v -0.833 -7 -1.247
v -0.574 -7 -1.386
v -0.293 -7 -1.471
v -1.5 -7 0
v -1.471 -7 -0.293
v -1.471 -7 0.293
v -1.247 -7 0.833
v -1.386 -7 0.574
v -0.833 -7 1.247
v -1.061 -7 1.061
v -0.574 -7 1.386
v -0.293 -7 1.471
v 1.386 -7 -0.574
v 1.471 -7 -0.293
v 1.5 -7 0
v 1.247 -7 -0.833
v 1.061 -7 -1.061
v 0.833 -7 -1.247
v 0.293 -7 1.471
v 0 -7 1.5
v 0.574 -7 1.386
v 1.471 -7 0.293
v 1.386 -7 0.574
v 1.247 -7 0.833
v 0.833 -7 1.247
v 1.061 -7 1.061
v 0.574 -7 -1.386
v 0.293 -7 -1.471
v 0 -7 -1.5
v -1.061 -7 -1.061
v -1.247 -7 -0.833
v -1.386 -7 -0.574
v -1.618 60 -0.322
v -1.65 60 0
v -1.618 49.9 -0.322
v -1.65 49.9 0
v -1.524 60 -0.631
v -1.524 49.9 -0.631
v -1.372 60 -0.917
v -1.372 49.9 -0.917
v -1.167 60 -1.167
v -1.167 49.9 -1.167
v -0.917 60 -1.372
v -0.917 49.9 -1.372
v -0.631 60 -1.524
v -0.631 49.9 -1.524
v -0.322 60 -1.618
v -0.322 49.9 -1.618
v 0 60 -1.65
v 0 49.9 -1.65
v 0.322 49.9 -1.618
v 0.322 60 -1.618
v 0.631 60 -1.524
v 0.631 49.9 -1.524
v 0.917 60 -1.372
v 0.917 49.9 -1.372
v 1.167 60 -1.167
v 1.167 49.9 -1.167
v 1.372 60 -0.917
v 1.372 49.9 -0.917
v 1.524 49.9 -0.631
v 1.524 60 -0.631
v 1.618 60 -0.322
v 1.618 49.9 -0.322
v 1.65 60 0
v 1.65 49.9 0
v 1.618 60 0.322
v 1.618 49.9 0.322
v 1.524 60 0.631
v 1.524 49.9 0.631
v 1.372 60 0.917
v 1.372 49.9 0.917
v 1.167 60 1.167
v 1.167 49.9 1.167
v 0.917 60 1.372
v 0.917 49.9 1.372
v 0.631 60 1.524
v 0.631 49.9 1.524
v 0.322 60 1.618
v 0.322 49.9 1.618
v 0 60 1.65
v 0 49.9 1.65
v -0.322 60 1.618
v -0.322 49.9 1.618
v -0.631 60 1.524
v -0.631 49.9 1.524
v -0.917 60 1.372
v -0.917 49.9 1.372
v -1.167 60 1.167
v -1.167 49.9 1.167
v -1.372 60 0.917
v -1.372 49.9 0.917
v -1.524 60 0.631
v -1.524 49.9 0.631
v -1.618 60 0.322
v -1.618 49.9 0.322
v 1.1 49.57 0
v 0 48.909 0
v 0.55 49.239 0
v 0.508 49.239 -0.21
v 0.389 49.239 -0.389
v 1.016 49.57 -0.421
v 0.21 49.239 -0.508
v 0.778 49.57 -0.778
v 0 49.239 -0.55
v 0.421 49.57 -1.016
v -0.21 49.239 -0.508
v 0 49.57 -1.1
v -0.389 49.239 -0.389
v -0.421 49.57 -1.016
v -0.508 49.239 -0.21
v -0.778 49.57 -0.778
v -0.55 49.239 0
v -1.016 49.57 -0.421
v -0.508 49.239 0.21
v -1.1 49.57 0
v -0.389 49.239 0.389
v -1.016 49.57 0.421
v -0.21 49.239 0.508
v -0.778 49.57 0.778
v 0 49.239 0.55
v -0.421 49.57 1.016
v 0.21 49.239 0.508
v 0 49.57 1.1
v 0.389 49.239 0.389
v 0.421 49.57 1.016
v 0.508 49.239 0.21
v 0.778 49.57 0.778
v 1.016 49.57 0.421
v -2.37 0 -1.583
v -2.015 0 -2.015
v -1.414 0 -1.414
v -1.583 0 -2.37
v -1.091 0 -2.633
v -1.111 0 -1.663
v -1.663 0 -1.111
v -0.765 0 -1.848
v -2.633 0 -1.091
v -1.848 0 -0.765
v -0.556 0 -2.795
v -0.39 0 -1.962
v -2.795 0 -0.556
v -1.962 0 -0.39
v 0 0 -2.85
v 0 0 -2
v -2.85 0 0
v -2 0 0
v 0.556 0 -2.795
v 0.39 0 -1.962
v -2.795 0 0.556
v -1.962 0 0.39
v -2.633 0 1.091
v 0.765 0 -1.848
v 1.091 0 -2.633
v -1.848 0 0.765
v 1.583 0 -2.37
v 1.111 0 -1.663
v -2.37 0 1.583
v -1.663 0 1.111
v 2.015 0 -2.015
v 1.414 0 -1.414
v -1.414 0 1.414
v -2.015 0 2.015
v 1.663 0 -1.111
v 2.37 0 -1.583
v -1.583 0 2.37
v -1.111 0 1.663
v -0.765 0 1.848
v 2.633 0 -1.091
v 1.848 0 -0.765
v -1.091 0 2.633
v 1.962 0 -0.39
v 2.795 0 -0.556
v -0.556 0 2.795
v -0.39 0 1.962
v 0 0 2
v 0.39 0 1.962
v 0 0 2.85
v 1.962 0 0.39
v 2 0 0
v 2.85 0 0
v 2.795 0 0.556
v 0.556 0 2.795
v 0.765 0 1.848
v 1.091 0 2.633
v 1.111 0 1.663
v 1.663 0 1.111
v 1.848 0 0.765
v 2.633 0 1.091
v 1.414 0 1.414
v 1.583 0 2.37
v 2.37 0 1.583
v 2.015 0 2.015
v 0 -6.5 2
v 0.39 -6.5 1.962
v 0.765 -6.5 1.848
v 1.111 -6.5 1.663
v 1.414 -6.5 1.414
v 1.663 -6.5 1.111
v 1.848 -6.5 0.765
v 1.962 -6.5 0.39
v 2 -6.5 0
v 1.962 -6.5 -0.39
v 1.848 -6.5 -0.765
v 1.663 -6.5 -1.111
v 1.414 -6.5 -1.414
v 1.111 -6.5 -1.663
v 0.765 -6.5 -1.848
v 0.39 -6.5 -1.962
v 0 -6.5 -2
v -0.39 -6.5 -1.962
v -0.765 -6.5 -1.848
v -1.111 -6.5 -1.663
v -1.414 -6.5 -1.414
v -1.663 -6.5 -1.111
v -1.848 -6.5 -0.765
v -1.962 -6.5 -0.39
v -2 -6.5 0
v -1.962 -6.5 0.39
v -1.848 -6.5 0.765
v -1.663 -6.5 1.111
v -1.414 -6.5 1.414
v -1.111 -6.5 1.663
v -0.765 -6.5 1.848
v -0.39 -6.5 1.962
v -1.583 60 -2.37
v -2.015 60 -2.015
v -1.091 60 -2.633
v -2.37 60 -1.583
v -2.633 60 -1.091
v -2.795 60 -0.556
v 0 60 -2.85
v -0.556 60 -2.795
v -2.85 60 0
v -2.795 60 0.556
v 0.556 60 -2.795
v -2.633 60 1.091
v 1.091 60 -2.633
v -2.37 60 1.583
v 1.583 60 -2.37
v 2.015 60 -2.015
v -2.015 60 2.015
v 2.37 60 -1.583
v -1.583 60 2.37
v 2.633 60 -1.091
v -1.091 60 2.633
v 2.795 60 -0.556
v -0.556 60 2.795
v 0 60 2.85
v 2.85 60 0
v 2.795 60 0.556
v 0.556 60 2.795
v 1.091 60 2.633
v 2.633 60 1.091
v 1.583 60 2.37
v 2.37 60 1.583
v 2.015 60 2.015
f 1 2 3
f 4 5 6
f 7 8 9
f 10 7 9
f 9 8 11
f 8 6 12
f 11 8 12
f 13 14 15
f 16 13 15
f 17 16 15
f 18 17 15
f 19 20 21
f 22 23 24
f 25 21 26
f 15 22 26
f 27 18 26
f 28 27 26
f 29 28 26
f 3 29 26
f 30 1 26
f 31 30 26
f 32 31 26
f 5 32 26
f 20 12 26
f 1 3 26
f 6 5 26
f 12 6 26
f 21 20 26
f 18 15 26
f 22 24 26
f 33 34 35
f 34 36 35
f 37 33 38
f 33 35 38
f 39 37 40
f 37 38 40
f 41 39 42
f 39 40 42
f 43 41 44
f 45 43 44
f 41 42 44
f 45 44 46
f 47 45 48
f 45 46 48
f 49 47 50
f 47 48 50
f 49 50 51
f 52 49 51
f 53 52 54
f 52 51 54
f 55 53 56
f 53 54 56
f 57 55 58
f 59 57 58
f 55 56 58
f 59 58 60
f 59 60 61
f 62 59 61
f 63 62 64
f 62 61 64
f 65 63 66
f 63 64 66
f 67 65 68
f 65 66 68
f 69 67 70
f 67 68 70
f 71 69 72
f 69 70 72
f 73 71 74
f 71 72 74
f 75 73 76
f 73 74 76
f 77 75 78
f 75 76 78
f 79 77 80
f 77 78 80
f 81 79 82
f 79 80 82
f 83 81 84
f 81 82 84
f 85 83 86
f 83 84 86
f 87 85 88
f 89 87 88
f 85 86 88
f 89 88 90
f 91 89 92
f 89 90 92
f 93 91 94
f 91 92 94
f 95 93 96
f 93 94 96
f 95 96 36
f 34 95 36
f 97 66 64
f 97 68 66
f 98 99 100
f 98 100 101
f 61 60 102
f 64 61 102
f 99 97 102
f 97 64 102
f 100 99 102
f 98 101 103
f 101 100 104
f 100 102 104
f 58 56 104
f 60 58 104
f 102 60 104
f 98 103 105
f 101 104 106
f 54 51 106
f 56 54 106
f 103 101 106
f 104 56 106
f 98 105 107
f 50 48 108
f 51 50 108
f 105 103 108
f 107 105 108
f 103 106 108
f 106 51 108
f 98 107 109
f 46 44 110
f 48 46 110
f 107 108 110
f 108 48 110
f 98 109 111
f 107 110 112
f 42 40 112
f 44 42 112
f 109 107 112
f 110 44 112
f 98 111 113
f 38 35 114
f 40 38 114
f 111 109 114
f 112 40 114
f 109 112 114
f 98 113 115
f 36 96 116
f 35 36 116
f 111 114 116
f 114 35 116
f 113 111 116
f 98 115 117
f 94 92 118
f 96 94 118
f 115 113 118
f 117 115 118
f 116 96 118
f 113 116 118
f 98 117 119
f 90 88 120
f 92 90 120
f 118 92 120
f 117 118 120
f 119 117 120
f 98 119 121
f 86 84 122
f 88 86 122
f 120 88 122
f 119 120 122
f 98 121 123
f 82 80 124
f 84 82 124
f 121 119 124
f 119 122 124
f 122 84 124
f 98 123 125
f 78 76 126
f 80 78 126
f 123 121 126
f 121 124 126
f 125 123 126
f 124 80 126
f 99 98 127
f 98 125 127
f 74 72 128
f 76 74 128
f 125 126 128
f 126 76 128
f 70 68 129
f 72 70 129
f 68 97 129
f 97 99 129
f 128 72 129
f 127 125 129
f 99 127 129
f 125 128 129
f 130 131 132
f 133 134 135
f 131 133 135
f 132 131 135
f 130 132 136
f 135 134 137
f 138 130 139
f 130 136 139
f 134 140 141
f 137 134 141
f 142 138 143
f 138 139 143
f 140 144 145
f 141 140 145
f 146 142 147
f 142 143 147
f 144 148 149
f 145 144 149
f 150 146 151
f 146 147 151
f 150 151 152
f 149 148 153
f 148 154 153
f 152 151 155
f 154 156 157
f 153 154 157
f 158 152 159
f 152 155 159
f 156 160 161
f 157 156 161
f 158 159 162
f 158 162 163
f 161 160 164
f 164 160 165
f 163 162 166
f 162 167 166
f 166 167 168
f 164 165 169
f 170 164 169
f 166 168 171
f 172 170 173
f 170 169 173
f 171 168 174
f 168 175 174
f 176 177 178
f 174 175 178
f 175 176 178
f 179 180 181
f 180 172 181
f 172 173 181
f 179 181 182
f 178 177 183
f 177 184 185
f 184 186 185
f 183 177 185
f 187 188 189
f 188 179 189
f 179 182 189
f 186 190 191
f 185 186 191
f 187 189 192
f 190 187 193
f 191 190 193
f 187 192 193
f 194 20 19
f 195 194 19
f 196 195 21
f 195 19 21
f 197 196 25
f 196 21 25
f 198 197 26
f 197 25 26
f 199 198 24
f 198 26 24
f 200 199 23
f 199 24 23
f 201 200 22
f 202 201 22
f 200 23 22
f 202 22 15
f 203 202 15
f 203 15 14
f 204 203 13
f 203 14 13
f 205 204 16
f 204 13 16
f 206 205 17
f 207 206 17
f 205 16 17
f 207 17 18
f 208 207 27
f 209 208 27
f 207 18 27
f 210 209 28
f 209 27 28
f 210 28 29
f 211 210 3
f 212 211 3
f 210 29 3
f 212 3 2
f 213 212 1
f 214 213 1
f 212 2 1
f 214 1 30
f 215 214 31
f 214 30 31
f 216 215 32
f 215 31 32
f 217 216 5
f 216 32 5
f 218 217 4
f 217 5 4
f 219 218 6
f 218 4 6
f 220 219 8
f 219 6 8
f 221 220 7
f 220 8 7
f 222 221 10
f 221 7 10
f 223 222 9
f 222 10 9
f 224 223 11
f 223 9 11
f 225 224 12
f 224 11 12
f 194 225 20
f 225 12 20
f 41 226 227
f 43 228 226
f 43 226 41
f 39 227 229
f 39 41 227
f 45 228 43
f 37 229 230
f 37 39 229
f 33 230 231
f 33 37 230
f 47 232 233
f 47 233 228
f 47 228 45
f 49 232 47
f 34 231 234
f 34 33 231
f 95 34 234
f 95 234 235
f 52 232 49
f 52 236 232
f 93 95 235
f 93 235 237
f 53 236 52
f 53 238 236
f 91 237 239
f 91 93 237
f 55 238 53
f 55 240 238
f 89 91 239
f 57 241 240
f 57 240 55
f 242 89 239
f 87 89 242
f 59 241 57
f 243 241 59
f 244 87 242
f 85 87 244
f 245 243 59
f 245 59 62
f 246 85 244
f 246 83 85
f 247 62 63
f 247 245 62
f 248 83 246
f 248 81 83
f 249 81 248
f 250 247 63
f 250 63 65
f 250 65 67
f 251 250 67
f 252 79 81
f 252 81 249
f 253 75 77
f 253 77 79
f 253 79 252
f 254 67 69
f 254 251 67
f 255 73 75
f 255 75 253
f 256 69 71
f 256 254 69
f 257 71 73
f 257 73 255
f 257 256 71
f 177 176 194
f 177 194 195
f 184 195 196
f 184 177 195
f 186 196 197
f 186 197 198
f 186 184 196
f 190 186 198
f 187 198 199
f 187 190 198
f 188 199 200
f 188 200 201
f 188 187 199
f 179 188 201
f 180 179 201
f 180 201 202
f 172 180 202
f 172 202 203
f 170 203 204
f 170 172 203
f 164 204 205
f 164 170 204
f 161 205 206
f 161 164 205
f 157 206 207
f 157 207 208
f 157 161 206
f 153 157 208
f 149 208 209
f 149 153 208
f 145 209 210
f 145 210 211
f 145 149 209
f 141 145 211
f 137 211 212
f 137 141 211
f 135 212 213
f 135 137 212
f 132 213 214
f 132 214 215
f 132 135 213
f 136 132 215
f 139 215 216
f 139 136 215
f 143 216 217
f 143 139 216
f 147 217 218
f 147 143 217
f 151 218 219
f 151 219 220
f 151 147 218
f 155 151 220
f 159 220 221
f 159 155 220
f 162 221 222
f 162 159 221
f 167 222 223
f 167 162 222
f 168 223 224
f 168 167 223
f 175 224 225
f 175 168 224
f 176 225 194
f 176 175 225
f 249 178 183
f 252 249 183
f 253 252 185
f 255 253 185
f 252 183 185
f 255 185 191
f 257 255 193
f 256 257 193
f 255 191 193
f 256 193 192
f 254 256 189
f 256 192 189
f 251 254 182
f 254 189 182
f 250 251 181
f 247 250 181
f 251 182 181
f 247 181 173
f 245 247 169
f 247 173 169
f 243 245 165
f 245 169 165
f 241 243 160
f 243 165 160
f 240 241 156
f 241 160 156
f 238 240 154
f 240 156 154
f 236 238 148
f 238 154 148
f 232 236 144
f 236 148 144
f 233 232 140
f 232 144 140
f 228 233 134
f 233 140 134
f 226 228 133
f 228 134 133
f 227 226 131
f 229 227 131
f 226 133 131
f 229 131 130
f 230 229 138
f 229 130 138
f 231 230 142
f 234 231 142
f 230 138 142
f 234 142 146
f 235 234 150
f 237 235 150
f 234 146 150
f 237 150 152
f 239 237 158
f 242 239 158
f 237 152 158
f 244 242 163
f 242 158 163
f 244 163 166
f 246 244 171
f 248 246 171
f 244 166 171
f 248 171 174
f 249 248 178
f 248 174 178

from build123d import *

# Parameters (mm, degrees)
SKETCH1_R                 = 2.85
BOSS_EXTRUDE1_DEPTH       = 60
SKETCH1_4_R               = 2
BOSS_EXTRUDE2_DEPTH       = 7
M4X0_7_TAPPED_HOLE1_D     = 3.3
M4X0_7_TAPPED_HOLE1_DEPTH = 10.1
M4X0_7_TAPPED_HOLE1_TIP   = 0.991420021
CHAMFER1_SIZE             = 0.5


with BuildPart() as part:
    # Sketch1 → Boss-Extrude1 (new body)
    with BuildSketch(Plane(origin=(0, 0, 0), x_dir=(1, 0, 0), z_dir=(0, 1, 0))):
        Circle(SKETCH1_R)
    extrude(amount=BOSS_EXTRUDE1_DEPTH)

    # Sketch1<4> → Boss-Extrude2 (add)
    with BuildSketch(Plane(origin=(0, 0, 0), x_dir=(1, 0, 0), z_dir=(0, 1, 0))):
        Circle(SKETCH1_4_R)
    extrude(amount=-BOSS_EXTRUDE2_DEPTH)

    # M4x0.7 Tapped Hole1
    with Locations(Plane(origin=(0, 60, 0), x_dir=(1, 0, 0), z_dir=(0, 1, 0))):
        with Locations((0, 0)):
            Hole(M4X0_7_TAPPED_HOLE1_D / 2, depth=M4X0_7_TAPPED_HOLE1_DEPTH)
            with Locations((0, 0, -(M4X0_7_TAPPED_HOLE1_DEPTH + M4X0_7_TAPPED_HOLE1_TIP / 2))):  # 118° drill point
                Cone(0, M4X0_7_TAPPED_HOLE1_D / 2, M4X0_7_TAPPED_HOLE1_TIP, mode=Mode.SUBTRACT)

    # Chamfer1
    chamfer1_edges = [part.edges().sort_by_distance(p)[0] for p in [
        (-2, -7, 0),
    ]]
    chamfer(chamfer1_edges, length=CHAMFER1_SIZE)


solid = part.part
